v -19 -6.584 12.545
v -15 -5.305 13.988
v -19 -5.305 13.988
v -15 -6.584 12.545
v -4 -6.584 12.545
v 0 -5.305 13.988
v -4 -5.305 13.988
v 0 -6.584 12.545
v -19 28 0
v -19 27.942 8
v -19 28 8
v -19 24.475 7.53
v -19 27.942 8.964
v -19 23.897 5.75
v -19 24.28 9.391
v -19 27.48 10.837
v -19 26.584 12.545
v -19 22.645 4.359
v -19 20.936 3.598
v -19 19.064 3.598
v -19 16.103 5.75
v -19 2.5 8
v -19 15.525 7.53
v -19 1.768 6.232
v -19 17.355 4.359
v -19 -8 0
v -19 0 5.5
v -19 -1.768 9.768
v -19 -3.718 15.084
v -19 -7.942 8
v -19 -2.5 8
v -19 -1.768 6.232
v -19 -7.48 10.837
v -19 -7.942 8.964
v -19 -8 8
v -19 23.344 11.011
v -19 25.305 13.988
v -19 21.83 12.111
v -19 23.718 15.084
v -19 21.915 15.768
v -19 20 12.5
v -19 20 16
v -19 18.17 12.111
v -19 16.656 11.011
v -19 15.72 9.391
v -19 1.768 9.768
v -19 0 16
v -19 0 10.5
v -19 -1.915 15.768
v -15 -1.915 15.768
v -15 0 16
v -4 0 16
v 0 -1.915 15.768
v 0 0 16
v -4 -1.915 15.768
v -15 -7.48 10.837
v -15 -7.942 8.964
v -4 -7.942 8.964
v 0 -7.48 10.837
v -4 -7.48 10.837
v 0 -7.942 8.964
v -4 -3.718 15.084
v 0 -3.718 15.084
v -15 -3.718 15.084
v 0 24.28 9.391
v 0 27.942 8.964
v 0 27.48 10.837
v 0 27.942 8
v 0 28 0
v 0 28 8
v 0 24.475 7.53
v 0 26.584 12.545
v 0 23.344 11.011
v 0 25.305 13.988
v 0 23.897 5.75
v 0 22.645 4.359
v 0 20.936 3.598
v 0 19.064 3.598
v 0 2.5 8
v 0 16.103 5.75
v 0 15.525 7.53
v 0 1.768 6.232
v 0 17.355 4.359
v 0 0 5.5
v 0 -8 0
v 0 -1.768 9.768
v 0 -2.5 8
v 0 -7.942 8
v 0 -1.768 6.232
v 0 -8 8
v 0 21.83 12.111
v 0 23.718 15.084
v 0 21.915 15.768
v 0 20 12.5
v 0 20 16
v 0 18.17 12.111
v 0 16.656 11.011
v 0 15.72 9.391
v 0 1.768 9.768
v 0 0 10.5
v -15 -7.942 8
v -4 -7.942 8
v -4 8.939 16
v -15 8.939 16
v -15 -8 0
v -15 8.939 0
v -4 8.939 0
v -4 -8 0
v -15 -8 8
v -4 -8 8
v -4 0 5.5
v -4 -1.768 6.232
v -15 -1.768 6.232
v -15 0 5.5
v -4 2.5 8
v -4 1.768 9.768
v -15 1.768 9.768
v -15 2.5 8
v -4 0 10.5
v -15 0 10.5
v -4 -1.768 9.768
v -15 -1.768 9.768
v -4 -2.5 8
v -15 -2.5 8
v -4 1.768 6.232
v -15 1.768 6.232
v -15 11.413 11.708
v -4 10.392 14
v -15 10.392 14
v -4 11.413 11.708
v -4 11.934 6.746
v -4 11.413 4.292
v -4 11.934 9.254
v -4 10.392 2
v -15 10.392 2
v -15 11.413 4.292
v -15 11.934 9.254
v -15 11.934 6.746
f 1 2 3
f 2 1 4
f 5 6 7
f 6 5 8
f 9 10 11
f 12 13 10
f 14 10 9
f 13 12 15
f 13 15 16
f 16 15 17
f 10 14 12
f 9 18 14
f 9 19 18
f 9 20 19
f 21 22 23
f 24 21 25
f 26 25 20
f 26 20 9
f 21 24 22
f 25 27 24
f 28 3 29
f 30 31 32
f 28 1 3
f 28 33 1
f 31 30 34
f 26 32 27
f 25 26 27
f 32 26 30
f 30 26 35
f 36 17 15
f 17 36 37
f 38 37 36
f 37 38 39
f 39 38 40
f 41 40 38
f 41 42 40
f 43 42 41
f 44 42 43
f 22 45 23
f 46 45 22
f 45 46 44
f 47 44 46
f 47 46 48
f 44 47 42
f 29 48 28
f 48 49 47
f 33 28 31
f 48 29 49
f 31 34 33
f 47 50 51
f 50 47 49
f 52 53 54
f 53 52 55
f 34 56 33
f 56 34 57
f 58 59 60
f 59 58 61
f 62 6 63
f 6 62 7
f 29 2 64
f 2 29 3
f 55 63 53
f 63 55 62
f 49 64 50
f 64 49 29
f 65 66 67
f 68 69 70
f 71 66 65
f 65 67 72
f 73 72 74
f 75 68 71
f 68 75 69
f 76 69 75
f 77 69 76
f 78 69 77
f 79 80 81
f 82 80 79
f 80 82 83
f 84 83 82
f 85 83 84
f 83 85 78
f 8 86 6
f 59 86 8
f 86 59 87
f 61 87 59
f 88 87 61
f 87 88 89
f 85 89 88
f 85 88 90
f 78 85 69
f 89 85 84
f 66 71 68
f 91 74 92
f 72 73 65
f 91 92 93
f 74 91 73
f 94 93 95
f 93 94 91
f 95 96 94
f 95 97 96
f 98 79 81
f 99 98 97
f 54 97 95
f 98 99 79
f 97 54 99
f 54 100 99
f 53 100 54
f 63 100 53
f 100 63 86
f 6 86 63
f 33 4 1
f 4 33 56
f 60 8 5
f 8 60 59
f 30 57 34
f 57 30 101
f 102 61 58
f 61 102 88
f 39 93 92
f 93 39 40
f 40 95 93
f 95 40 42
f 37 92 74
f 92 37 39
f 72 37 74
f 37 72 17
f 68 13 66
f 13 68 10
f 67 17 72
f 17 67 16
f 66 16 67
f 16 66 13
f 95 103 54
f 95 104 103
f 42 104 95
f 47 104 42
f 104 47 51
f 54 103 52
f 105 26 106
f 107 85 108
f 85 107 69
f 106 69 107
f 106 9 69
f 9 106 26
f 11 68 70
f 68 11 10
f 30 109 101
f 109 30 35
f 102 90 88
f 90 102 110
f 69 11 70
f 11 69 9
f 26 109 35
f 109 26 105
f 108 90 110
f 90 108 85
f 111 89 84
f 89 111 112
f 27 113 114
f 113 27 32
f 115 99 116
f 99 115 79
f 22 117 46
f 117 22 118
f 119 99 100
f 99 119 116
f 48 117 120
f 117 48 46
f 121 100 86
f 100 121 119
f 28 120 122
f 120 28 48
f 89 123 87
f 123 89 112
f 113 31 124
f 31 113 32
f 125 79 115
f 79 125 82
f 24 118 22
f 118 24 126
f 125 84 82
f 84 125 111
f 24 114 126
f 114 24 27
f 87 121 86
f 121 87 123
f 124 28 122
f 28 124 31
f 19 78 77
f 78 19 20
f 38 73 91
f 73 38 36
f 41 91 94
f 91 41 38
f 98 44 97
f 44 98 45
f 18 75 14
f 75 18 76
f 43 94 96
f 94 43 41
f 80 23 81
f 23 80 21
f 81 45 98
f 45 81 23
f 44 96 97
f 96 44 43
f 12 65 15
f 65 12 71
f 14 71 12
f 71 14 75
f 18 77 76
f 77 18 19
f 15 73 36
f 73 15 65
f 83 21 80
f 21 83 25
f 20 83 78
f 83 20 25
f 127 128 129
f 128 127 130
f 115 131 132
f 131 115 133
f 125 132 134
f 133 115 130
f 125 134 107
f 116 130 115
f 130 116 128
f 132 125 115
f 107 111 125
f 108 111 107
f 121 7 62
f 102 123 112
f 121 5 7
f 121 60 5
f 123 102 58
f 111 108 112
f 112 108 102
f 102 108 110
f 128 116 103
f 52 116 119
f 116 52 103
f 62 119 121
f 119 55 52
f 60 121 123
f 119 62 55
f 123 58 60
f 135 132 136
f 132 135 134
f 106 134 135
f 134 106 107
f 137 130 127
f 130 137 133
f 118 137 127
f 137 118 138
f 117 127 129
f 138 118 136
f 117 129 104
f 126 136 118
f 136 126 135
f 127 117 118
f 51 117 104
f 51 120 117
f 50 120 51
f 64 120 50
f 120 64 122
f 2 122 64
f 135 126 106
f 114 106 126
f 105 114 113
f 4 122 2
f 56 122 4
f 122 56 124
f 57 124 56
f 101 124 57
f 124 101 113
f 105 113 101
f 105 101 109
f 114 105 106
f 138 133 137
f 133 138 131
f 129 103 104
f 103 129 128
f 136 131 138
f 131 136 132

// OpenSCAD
// PRUSA iteration3
// Y idler
// GNU GPL v3
// Josef Průša <iam@josefprusa.cz> and contributors
// http://www.reprap.org/wiki/Prusa_Mendel
// http://prusamendel.org


module y_idler_base(){
 translate(v = [0,0,0]) cylinder(h = 19, r=8);	
 translate(v = [0,20,0]) cylinder(h = 19, r=8);
 translate(v = [0,10,9.5]) cube(size = [16,20,19], center=true);
 translate(v = [-4,10,9.5]) cube(size = [8,16+20,19], center=true);
}

module y_idler_holes(){
 translate(v = [0,0,-1]) cylinder(h = 120, r=2.5);	
 translate(v = [0,20,-1]) cylinder(h = 25, r=4.5);
 translate(v = [0,0,4]) cylinder(h = 11, r=12);
}

// Final part
module y_idler(){
 translate(v = [0,0,8])rotate([0,-90,0]) difference(){
  y_idler_base();
  y_idler_holes();
 }
}

y_idler();
